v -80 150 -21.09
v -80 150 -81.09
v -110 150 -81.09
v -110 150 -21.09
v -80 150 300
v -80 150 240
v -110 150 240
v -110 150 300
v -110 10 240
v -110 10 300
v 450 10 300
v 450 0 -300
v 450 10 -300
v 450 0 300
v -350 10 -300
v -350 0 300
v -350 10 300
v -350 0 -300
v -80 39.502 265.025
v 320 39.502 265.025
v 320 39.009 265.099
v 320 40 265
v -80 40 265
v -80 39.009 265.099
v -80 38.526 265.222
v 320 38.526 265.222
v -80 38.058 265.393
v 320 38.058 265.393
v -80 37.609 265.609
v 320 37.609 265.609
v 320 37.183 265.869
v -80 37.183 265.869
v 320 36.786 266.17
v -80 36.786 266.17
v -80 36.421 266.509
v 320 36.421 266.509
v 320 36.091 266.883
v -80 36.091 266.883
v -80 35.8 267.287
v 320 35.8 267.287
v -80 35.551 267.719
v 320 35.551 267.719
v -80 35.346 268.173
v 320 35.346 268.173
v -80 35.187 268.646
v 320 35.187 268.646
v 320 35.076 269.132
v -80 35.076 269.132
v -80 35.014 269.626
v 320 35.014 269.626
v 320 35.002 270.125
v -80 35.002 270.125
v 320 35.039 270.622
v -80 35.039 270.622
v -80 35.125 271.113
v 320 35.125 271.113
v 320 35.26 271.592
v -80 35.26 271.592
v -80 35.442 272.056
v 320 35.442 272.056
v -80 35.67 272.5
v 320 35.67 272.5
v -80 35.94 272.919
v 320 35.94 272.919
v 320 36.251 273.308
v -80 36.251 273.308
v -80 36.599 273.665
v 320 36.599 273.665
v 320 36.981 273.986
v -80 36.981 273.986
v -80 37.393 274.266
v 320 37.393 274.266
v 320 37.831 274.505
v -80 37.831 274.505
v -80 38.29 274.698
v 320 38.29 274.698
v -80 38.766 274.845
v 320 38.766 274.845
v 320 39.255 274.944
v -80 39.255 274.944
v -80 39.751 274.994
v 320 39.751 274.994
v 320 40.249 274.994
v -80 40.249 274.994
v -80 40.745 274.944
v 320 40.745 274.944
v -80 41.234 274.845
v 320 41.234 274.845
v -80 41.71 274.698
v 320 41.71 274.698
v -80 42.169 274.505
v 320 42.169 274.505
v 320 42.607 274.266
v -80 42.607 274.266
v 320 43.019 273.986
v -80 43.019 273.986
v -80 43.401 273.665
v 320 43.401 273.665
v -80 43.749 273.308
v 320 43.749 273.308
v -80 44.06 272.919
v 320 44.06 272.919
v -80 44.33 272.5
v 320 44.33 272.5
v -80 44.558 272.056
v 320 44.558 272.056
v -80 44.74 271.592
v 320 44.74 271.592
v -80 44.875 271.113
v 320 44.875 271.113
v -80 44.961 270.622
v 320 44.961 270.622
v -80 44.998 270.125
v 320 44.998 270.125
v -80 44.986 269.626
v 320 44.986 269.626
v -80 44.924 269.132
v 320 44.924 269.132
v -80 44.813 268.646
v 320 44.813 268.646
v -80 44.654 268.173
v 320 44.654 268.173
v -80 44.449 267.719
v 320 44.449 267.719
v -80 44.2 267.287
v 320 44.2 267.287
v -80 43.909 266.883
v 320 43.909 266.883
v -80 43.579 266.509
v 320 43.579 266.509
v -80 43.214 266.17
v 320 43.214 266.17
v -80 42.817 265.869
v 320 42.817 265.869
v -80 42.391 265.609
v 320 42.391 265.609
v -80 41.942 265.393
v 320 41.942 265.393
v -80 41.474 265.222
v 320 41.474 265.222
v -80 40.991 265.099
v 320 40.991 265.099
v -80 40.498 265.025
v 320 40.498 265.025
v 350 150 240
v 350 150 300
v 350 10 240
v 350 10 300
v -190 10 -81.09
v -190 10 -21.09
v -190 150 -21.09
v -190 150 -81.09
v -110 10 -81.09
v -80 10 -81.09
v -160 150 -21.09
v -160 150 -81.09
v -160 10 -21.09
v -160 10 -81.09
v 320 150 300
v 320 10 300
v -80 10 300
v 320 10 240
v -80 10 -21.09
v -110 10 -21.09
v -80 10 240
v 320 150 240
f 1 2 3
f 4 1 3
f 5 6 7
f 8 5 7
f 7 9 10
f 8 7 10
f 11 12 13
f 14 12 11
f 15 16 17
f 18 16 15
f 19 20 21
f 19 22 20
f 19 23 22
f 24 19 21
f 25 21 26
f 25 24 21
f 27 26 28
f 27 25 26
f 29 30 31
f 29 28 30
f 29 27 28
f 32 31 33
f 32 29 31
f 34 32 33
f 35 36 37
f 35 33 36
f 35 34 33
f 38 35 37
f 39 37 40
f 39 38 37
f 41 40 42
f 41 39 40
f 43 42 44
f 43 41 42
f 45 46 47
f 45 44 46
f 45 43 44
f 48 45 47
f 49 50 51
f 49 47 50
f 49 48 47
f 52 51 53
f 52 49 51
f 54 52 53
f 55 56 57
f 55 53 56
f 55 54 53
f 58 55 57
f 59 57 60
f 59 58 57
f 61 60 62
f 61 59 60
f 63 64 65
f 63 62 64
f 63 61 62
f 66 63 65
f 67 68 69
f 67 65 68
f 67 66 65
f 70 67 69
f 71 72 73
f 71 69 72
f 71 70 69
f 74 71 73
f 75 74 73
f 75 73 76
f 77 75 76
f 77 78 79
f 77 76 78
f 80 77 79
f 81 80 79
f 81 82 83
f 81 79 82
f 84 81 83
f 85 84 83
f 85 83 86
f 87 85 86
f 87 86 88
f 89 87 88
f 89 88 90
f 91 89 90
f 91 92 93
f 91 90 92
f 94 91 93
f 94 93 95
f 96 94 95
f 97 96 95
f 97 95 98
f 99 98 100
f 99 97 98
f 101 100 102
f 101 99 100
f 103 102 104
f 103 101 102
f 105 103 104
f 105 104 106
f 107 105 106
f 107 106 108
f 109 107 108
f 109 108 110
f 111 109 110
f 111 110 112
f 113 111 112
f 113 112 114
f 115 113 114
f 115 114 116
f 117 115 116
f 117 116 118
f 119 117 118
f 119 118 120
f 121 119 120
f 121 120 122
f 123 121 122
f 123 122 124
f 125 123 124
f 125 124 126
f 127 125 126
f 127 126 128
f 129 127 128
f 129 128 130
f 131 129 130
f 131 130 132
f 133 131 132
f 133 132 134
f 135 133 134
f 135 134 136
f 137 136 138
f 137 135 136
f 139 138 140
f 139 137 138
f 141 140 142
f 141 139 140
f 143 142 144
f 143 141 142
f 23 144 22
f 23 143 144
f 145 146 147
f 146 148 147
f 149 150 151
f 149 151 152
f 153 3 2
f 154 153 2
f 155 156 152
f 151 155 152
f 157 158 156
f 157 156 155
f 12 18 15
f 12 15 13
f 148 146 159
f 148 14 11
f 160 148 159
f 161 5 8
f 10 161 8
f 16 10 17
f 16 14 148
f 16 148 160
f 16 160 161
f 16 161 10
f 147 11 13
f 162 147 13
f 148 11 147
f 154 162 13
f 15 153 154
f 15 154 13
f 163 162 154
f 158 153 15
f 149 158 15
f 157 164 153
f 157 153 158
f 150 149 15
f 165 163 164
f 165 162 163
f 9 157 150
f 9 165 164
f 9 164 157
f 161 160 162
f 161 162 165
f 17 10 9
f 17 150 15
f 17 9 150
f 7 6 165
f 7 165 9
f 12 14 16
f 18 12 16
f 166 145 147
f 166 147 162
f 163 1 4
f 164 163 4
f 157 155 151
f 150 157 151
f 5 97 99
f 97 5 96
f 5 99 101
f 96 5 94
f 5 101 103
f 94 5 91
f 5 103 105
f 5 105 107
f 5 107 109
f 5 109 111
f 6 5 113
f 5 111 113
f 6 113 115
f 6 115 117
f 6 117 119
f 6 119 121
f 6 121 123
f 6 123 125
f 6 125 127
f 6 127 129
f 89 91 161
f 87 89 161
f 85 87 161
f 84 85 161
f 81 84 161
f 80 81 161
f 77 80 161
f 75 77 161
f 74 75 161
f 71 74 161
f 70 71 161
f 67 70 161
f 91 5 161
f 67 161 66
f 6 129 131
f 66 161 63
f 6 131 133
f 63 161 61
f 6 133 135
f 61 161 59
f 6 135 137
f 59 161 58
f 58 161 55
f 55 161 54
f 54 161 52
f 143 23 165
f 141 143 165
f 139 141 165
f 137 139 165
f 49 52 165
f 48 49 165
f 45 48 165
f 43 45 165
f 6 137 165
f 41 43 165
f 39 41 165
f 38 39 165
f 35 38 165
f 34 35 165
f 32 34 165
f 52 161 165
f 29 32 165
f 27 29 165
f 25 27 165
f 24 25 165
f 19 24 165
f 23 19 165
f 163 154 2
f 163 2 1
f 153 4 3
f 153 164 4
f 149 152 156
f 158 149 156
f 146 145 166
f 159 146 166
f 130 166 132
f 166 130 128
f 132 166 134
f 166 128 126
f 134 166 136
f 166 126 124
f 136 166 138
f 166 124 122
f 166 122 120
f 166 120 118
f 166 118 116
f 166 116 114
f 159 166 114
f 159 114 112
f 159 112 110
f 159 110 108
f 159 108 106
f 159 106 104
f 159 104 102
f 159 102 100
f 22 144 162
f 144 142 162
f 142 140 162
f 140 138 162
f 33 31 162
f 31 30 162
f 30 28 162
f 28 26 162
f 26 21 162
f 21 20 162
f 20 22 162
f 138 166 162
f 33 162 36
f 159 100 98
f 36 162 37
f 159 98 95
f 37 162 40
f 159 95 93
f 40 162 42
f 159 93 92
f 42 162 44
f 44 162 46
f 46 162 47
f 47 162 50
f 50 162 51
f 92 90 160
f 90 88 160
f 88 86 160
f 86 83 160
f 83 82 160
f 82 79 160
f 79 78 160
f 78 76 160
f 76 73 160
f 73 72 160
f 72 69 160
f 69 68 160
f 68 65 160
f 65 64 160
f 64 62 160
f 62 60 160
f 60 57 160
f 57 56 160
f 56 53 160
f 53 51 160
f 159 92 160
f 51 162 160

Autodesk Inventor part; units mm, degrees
ref_plane "YZ Plane" through (0, 0, 0) normal (1, 0, 0) x (0, 1, 0)
ref_plane "XZ Plane" through (0, 0, 0) normal (0, 1, 0) x (-1, 0, 0)
ref_plane "XY Plane" through (0, 0, 0) normal (0, 0, 1) x (1, 0, 0)
sketch "Sketch1" plane through (0, 0, 0) normal (0, 1, 0) x (-1, 0, 0)
  line L0 (350, -300) -> (-450, -300)
  line L1 (-450, -300) -> (-450, 300)
  line L2 (-450, 300) -> (350, 300)
  line L3 (350, 300) -> (350, -300)
  line L4 (-450, 240) -> (-450, 300)
  line L5 (110, 300) -> (80, 300)
  line L6 (80, 300) -> (80, 240)
  line L7 (80, 240) -> (110, 240)
  line L8 (110, 240) -> (110, 300)
  line L9 (110, -81.09) -> (80, -81.09)
  line L10 (80, -81.09) -> (80, -21.09)
  line L11 (80, -21.09) -> (110, -21.09)
  line L12 (110, -21.09) -> (110, -81.09)
  line L13 (-320, 300) -> (-350, 300)
  line L14 (-350, 300) -> (-350, 240)
  line L15 (-350, 240) -> (-320, 240)
  line L16 (-320, 240) -> (-320, 300)
  line L17 (190, -81.09) -> (160, -81.09)
  line L18 (160, -81.09) -> (160, -21.09)
  line L19 (160, -21.09) -> (190, -21.09)
  line L20 (190, -21.09) -> (190, -81.09)
  point P0 (-50, 300)
  point P1 (350, 0)
  point P2 (95, 240)
  point P3 (80, 300)
  point P4 (110, -51.09)
  point P5 (110, 270)
  point P6 (-350, 300)
  point P7 (80, 270)
  point P8 (190, -51.09)
  dimension "d0" = 600
  dimension "d1" = 800
  dimension "d22" = 60
  dimension "d23" = 30
  dimension "d27" = 321.09
  dimension "d28" = 30
  dimension "d31" = 400
  dimension "d32" = 60
  dimension "d33" = 30
  dimension "d38" = 50
extrude "Extrusion1" add sketch "Sketch1" along normal blind 10 contours L0 L1 L2 L14 L15 L16 L6 L7 L8 L3 | L2 L16 L15 L14 | L9 L10 L11 L12 | L17 L18 L19 L20
extrude "Extrusion6" add sketch "Sketch1" along normal blind 150 contours L9 L10 L11 L12
extrude "Extrusion7" add sketch "Sketch1" along normal blind 150 contours L8 L7 L6 L2 | L2 L16 L15 L14
extrude "Extrusion8" add sketch "Sketch1" along normal blind 150 contours L17 L18 L19 L20
sketch "Sketch5" plane through (-80, 10, 240) normal (1, 0, 0) x (0, 0, -1)
  circle A0 centre (-30, 30) radius 5
  line L0 (-60, 0) -> (-60, 140) projected
  line L1 (-60, 0) -> (0, 0) projected
  point P0 (240, -10)
  dimension "d41" = 10
  dimension "d42" = 30
  dimension "d43" = 30
extrude "Extrusion9" add sketch "Sketch5" along normal up to surface (400 mm away)
equation "\"d22\" = d3"
equation "\"d23\" = d2"
equation "\"d28\" = d23"
equation "\"d32\" = d34"
equation "\"d33\" = d35"
equation "\"d3\" = 60"
equation "\"d2\" = 30"
equation "\"d34\" = 60"
equation "\"d35\" = 30"
properties part number "base"
